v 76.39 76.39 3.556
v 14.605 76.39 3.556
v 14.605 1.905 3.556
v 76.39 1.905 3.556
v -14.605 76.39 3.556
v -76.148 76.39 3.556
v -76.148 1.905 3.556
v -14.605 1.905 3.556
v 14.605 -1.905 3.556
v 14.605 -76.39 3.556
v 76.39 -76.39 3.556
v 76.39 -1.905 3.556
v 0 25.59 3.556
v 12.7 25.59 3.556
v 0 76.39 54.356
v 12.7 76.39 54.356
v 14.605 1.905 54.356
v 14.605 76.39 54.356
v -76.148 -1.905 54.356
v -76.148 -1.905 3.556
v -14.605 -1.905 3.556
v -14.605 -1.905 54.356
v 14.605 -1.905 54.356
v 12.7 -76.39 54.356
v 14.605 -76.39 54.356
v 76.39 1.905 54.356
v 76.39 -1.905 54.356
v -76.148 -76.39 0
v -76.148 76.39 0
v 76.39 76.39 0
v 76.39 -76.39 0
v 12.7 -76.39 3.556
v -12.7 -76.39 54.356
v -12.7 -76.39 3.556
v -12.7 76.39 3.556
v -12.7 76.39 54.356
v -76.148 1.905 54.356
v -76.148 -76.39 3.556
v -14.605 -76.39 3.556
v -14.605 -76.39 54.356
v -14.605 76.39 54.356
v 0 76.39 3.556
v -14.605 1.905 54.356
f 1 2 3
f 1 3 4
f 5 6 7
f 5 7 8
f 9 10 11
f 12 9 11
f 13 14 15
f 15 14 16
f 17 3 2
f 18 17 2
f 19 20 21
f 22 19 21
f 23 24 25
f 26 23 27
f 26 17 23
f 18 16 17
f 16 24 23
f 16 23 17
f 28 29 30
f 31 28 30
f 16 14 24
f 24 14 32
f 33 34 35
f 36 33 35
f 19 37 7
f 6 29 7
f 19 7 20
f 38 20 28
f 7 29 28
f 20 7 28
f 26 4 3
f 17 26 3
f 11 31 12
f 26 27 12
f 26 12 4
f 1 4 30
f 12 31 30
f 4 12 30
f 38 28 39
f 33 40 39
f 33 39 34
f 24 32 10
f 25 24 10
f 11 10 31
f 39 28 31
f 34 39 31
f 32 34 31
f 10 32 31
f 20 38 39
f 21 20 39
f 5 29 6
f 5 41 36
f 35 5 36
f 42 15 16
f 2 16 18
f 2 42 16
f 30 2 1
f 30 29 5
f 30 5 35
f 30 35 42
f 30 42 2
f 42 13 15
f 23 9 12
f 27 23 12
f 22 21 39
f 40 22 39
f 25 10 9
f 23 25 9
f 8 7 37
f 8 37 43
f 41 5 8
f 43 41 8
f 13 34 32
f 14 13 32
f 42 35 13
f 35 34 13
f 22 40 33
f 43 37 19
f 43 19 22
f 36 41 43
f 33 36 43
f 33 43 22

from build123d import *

# Parameters (mm, degrees)
F0_W     = 152.5379121304
F0_H     = 152.7792811394
F1_DEPTH = 3.556
F2_W     = 12.7
F2_H     = 50.8
F3_DEPTH = 50.8
F5_DEPTH = 25.4
F6_W     = 61.5432790112
F6_H     = 1.905
F7_DEPTH = 50.8


with BuildPart() as f1:
    # F0 (on Top) → F1 (new body)
    with BuildSketch(Plane.XY):
        with Locations((0.1206770539, 0)):
            Rectangle(F0_W, F0_H)
    extrude(amount=F1_DEPTH)

    # F2 (on face) → F3 (join)
    with BuildSketch(Plane.XY.offset(3.556)):
        with Locations((6.35, 50.9896405697)):
            Rectangle(F2_W, F2_H)
    extrude(amount=F3_DEPTH)

    # F4 (on face) → F5 (cut)
    with BuildSketch(Plane.YZ.offset(12.7)):
        Polygon((25.5896405697, 3.556), (76.3896405697, 54.356), (25.5896405697, 54.356), align=None)
    extrude(amount=-F5_DEPTH, mode=Mode.SUBTRACT)

    # F6 (on face) → F7 (join)
    with BuildSketch(Plane.XY.offset(3.556)):
        with Locations((-45.3766395056, 0.9525)):
            Rectangle(F6_W, F6_H)
        with Locations((-45.3766395056, -0.9525)):
            Rectangle(F6_W, F6_H)
        Polygon((-12.7, 0), (-12.7, 25.5896405697), (-12.7, 76.3896405697), (-14.605, 76.3896405697), (-14.605, 1.905), (-14.605, 0), align=None)
        Polygon((-14.605, -76.3896405697), (-12.7, -76.3896405697), (-12.7, 0), (-14.605, 0), (-14.605, -1.905), align=None)
        Polygon((14.605, 76.3896405697), (12.7, 76.3896405697), (12.7, 25.5896405697), (12.7, 0), (14.605, 0), (14.605, 1.905), align=None)
        Polygon((14.605, 0), (12.7, 0), (12.7, -76.3896405697), (14.605, -76.3896405697), (14.605, -1.905), align=None)
        Polygon((76.1482790112, 1.905), (14.605, 1.905), (14.605, 0), (76.3896331191, 0), (76.3896331191, 1.905), align=None)
        Polygon((76.3896331191, 0), (14.605, 0), (14.605, -1.905), (76.1482790112, -1.905), (76.3896331191, -1.905), align=None)
    extrude(amount=F7_DEPTH)


solid = f1.part
